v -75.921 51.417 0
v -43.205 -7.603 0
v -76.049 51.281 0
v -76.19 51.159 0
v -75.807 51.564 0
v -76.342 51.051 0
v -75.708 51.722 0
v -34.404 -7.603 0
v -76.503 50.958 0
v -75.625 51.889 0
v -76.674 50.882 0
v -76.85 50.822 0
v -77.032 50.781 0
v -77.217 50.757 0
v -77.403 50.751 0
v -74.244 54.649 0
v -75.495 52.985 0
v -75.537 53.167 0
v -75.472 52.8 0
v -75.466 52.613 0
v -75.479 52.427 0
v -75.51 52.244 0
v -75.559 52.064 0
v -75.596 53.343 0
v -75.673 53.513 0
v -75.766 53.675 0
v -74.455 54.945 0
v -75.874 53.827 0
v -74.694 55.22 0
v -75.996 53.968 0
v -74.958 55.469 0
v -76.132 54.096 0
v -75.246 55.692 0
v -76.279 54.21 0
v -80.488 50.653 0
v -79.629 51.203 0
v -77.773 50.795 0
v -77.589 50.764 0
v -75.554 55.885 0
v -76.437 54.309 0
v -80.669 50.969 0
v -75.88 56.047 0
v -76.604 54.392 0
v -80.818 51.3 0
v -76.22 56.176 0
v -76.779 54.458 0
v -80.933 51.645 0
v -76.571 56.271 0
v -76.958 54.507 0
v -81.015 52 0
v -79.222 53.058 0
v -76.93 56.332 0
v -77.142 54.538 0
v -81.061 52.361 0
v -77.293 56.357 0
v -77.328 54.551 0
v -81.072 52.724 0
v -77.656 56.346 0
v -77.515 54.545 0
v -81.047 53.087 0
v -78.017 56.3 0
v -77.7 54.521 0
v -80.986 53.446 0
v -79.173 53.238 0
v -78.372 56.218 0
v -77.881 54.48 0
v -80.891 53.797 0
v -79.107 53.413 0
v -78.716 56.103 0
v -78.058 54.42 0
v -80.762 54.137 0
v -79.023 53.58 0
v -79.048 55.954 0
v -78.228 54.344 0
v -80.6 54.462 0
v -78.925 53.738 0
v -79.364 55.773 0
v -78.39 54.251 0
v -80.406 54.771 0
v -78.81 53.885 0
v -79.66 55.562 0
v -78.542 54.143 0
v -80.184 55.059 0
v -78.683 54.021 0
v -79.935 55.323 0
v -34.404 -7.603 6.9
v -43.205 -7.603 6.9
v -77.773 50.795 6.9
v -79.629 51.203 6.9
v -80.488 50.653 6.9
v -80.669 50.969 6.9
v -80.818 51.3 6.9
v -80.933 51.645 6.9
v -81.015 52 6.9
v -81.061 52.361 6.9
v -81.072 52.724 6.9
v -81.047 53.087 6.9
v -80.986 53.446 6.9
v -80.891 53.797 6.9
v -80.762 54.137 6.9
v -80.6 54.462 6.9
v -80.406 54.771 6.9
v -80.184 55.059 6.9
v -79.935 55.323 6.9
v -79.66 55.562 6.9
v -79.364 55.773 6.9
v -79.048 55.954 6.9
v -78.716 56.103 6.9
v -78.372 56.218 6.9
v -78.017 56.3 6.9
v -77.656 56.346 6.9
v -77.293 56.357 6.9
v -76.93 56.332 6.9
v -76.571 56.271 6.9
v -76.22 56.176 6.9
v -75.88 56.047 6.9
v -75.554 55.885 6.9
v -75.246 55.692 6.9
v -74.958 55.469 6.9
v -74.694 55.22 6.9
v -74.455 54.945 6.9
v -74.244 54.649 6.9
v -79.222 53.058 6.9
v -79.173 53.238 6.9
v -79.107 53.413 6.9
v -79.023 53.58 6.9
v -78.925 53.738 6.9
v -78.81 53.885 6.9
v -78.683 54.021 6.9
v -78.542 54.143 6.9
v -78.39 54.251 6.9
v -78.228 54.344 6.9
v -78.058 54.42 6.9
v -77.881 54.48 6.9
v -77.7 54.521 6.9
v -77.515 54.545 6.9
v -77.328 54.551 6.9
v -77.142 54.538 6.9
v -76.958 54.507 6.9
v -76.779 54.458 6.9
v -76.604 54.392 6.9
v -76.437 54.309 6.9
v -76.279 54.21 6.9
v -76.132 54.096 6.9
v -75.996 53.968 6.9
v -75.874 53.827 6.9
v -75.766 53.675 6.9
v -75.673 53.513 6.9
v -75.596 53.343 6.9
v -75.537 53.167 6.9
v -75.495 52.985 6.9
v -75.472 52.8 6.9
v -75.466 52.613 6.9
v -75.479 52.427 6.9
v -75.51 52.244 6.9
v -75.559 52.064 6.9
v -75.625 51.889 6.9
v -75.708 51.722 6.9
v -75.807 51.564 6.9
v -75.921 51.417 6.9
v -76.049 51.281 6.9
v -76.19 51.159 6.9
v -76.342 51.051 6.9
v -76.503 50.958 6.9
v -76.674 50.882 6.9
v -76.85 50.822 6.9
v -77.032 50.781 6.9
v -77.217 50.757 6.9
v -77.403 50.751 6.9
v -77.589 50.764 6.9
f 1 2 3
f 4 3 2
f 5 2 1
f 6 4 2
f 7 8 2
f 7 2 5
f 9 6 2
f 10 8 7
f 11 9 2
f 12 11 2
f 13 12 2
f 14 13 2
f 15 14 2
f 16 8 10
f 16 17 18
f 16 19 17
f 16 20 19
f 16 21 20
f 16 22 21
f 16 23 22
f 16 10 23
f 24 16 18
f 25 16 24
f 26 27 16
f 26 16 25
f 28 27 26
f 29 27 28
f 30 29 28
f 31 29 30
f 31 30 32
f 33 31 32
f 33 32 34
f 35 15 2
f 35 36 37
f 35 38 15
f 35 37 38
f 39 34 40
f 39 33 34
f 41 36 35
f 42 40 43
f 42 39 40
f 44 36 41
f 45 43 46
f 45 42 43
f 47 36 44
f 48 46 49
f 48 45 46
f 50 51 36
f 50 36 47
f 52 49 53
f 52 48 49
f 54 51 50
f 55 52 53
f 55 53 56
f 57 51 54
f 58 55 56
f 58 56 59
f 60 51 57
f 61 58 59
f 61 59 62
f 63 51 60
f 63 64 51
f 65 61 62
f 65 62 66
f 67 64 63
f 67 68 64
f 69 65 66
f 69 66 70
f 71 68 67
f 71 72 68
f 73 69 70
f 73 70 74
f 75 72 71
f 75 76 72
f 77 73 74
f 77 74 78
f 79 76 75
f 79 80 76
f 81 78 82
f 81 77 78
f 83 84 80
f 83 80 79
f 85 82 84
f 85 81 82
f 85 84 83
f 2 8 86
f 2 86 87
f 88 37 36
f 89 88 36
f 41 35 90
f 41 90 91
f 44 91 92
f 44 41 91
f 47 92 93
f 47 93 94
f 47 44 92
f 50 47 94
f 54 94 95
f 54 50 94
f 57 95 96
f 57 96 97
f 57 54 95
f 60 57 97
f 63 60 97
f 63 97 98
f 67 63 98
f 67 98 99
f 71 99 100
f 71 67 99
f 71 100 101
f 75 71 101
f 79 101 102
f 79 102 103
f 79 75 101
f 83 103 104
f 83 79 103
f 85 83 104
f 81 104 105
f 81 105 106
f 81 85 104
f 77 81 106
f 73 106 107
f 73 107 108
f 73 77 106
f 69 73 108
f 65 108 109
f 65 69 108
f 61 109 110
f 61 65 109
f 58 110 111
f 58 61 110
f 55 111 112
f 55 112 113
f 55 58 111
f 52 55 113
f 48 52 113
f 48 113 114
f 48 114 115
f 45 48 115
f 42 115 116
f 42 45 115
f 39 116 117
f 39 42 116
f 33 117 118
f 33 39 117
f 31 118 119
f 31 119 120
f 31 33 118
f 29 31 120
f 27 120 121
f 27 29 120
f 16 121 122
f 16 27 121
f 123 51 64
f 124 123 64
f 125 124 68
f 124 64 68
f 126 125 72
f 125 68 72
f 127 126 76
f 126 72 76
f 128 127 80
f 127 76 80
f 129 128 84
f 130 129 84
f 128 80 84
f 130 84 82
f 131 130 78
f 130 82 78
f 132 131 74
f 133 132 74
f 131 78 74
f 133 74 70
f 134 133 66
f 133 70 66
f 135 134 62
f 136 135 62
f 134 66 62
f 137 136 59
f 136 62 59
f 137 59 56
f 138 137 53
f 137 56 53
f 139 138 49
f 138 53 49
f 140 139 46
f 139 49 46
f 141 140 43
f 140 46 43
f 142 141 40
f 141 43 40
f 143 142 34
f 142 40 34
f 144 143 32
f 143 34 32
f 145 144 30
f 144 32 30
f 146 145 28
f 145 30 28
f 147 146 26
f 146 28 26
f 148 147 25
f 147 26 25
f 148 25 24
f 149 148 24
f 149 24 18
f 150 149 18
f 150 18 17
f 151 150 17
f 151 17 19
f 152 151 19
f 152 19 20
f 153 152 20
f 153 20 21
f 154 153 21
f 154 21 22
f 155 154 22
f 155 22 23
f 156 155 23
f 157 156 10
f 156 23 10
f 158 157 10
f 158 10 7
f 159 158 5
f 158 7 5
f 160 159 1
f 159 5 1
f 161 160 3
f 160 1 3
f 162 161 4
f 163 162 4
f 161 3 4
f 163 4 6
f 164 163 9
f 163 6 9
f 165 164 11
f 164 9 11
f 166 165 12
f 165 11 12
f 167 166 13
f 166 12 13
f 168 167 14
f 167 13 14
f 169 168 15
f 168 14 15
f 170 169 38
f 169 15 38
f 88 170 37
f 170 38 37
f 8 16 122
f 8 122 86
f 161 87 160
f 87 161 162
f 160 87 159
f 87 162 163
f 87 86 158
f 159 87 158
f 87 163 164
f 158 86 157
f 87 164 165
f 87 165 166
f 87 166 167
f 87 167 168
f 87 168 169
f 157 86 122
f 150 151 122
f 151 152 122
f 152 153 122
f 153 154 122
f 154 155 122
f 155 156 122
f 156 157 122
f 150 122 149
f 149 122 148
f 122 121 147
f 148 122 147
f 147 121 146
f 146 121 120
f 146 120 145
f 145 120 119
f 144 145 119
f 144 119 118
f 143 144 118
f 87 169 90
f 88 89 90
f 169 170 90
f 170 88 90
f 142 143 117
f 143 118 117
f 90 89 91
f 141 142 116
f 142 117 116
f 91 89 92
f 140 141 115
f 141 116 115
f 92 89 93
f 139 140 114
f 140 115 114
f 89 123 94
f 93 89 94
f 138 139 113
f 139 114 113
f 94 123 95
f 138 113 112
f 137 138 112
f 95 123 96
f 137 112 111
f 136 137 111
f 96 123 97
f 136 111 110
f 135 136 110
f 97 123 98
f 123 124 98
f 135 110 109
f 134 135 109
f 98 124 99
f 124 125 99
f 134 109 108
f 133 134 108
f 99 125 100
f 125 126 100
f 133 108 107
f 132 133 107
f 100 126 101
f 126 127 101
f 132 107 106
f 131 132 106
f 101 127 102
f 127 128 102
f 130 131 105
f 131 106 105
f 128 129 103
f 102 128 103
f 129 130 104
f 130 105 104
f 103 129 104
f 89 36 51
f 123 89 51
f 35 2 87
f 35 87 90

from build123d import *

# Parameters (mm, degrees)
SALIENTE_EXTRUIR1_DEPTH = 6.9


with BuildPart() as part:
    # Croquis1 → Saliente-Extruir1 (new body)
    with BuildSketch(Plane.XY):
        with BuildLine():
            Line((-74.243930555, 54.648970741), (-34.403574409, -7.603291729))
            Line((-34.403574409, -7.603291729), (-43.204784385, -7.603291729))
            Line((-43.204784385, -7.603291729), (-80.487794166, 50.653007541))
            ThreePointArc((-80.487794166, 50.653007541), (-79.363843961, 55.772920947), (-74.243930555, 54.648970741))
        make_face()
        with BuildLine():
            Line((-79.629068495, 51.202576909), (-79.221671544, 53.058386092))
            ThreePointArc((-79.221671544, 53.058386092), (-75.765533956, 53.675171252), (-77.773259312, 50.795179958))
            Line((-77.773259312, 50.795179958), (-79.629068495, 51.202576909))
        make_face(mode=Mode.SUBTRACT)
    extrude(amount=SALIENTE_EXTRUIR1_DEPTH)


solid = part.part
